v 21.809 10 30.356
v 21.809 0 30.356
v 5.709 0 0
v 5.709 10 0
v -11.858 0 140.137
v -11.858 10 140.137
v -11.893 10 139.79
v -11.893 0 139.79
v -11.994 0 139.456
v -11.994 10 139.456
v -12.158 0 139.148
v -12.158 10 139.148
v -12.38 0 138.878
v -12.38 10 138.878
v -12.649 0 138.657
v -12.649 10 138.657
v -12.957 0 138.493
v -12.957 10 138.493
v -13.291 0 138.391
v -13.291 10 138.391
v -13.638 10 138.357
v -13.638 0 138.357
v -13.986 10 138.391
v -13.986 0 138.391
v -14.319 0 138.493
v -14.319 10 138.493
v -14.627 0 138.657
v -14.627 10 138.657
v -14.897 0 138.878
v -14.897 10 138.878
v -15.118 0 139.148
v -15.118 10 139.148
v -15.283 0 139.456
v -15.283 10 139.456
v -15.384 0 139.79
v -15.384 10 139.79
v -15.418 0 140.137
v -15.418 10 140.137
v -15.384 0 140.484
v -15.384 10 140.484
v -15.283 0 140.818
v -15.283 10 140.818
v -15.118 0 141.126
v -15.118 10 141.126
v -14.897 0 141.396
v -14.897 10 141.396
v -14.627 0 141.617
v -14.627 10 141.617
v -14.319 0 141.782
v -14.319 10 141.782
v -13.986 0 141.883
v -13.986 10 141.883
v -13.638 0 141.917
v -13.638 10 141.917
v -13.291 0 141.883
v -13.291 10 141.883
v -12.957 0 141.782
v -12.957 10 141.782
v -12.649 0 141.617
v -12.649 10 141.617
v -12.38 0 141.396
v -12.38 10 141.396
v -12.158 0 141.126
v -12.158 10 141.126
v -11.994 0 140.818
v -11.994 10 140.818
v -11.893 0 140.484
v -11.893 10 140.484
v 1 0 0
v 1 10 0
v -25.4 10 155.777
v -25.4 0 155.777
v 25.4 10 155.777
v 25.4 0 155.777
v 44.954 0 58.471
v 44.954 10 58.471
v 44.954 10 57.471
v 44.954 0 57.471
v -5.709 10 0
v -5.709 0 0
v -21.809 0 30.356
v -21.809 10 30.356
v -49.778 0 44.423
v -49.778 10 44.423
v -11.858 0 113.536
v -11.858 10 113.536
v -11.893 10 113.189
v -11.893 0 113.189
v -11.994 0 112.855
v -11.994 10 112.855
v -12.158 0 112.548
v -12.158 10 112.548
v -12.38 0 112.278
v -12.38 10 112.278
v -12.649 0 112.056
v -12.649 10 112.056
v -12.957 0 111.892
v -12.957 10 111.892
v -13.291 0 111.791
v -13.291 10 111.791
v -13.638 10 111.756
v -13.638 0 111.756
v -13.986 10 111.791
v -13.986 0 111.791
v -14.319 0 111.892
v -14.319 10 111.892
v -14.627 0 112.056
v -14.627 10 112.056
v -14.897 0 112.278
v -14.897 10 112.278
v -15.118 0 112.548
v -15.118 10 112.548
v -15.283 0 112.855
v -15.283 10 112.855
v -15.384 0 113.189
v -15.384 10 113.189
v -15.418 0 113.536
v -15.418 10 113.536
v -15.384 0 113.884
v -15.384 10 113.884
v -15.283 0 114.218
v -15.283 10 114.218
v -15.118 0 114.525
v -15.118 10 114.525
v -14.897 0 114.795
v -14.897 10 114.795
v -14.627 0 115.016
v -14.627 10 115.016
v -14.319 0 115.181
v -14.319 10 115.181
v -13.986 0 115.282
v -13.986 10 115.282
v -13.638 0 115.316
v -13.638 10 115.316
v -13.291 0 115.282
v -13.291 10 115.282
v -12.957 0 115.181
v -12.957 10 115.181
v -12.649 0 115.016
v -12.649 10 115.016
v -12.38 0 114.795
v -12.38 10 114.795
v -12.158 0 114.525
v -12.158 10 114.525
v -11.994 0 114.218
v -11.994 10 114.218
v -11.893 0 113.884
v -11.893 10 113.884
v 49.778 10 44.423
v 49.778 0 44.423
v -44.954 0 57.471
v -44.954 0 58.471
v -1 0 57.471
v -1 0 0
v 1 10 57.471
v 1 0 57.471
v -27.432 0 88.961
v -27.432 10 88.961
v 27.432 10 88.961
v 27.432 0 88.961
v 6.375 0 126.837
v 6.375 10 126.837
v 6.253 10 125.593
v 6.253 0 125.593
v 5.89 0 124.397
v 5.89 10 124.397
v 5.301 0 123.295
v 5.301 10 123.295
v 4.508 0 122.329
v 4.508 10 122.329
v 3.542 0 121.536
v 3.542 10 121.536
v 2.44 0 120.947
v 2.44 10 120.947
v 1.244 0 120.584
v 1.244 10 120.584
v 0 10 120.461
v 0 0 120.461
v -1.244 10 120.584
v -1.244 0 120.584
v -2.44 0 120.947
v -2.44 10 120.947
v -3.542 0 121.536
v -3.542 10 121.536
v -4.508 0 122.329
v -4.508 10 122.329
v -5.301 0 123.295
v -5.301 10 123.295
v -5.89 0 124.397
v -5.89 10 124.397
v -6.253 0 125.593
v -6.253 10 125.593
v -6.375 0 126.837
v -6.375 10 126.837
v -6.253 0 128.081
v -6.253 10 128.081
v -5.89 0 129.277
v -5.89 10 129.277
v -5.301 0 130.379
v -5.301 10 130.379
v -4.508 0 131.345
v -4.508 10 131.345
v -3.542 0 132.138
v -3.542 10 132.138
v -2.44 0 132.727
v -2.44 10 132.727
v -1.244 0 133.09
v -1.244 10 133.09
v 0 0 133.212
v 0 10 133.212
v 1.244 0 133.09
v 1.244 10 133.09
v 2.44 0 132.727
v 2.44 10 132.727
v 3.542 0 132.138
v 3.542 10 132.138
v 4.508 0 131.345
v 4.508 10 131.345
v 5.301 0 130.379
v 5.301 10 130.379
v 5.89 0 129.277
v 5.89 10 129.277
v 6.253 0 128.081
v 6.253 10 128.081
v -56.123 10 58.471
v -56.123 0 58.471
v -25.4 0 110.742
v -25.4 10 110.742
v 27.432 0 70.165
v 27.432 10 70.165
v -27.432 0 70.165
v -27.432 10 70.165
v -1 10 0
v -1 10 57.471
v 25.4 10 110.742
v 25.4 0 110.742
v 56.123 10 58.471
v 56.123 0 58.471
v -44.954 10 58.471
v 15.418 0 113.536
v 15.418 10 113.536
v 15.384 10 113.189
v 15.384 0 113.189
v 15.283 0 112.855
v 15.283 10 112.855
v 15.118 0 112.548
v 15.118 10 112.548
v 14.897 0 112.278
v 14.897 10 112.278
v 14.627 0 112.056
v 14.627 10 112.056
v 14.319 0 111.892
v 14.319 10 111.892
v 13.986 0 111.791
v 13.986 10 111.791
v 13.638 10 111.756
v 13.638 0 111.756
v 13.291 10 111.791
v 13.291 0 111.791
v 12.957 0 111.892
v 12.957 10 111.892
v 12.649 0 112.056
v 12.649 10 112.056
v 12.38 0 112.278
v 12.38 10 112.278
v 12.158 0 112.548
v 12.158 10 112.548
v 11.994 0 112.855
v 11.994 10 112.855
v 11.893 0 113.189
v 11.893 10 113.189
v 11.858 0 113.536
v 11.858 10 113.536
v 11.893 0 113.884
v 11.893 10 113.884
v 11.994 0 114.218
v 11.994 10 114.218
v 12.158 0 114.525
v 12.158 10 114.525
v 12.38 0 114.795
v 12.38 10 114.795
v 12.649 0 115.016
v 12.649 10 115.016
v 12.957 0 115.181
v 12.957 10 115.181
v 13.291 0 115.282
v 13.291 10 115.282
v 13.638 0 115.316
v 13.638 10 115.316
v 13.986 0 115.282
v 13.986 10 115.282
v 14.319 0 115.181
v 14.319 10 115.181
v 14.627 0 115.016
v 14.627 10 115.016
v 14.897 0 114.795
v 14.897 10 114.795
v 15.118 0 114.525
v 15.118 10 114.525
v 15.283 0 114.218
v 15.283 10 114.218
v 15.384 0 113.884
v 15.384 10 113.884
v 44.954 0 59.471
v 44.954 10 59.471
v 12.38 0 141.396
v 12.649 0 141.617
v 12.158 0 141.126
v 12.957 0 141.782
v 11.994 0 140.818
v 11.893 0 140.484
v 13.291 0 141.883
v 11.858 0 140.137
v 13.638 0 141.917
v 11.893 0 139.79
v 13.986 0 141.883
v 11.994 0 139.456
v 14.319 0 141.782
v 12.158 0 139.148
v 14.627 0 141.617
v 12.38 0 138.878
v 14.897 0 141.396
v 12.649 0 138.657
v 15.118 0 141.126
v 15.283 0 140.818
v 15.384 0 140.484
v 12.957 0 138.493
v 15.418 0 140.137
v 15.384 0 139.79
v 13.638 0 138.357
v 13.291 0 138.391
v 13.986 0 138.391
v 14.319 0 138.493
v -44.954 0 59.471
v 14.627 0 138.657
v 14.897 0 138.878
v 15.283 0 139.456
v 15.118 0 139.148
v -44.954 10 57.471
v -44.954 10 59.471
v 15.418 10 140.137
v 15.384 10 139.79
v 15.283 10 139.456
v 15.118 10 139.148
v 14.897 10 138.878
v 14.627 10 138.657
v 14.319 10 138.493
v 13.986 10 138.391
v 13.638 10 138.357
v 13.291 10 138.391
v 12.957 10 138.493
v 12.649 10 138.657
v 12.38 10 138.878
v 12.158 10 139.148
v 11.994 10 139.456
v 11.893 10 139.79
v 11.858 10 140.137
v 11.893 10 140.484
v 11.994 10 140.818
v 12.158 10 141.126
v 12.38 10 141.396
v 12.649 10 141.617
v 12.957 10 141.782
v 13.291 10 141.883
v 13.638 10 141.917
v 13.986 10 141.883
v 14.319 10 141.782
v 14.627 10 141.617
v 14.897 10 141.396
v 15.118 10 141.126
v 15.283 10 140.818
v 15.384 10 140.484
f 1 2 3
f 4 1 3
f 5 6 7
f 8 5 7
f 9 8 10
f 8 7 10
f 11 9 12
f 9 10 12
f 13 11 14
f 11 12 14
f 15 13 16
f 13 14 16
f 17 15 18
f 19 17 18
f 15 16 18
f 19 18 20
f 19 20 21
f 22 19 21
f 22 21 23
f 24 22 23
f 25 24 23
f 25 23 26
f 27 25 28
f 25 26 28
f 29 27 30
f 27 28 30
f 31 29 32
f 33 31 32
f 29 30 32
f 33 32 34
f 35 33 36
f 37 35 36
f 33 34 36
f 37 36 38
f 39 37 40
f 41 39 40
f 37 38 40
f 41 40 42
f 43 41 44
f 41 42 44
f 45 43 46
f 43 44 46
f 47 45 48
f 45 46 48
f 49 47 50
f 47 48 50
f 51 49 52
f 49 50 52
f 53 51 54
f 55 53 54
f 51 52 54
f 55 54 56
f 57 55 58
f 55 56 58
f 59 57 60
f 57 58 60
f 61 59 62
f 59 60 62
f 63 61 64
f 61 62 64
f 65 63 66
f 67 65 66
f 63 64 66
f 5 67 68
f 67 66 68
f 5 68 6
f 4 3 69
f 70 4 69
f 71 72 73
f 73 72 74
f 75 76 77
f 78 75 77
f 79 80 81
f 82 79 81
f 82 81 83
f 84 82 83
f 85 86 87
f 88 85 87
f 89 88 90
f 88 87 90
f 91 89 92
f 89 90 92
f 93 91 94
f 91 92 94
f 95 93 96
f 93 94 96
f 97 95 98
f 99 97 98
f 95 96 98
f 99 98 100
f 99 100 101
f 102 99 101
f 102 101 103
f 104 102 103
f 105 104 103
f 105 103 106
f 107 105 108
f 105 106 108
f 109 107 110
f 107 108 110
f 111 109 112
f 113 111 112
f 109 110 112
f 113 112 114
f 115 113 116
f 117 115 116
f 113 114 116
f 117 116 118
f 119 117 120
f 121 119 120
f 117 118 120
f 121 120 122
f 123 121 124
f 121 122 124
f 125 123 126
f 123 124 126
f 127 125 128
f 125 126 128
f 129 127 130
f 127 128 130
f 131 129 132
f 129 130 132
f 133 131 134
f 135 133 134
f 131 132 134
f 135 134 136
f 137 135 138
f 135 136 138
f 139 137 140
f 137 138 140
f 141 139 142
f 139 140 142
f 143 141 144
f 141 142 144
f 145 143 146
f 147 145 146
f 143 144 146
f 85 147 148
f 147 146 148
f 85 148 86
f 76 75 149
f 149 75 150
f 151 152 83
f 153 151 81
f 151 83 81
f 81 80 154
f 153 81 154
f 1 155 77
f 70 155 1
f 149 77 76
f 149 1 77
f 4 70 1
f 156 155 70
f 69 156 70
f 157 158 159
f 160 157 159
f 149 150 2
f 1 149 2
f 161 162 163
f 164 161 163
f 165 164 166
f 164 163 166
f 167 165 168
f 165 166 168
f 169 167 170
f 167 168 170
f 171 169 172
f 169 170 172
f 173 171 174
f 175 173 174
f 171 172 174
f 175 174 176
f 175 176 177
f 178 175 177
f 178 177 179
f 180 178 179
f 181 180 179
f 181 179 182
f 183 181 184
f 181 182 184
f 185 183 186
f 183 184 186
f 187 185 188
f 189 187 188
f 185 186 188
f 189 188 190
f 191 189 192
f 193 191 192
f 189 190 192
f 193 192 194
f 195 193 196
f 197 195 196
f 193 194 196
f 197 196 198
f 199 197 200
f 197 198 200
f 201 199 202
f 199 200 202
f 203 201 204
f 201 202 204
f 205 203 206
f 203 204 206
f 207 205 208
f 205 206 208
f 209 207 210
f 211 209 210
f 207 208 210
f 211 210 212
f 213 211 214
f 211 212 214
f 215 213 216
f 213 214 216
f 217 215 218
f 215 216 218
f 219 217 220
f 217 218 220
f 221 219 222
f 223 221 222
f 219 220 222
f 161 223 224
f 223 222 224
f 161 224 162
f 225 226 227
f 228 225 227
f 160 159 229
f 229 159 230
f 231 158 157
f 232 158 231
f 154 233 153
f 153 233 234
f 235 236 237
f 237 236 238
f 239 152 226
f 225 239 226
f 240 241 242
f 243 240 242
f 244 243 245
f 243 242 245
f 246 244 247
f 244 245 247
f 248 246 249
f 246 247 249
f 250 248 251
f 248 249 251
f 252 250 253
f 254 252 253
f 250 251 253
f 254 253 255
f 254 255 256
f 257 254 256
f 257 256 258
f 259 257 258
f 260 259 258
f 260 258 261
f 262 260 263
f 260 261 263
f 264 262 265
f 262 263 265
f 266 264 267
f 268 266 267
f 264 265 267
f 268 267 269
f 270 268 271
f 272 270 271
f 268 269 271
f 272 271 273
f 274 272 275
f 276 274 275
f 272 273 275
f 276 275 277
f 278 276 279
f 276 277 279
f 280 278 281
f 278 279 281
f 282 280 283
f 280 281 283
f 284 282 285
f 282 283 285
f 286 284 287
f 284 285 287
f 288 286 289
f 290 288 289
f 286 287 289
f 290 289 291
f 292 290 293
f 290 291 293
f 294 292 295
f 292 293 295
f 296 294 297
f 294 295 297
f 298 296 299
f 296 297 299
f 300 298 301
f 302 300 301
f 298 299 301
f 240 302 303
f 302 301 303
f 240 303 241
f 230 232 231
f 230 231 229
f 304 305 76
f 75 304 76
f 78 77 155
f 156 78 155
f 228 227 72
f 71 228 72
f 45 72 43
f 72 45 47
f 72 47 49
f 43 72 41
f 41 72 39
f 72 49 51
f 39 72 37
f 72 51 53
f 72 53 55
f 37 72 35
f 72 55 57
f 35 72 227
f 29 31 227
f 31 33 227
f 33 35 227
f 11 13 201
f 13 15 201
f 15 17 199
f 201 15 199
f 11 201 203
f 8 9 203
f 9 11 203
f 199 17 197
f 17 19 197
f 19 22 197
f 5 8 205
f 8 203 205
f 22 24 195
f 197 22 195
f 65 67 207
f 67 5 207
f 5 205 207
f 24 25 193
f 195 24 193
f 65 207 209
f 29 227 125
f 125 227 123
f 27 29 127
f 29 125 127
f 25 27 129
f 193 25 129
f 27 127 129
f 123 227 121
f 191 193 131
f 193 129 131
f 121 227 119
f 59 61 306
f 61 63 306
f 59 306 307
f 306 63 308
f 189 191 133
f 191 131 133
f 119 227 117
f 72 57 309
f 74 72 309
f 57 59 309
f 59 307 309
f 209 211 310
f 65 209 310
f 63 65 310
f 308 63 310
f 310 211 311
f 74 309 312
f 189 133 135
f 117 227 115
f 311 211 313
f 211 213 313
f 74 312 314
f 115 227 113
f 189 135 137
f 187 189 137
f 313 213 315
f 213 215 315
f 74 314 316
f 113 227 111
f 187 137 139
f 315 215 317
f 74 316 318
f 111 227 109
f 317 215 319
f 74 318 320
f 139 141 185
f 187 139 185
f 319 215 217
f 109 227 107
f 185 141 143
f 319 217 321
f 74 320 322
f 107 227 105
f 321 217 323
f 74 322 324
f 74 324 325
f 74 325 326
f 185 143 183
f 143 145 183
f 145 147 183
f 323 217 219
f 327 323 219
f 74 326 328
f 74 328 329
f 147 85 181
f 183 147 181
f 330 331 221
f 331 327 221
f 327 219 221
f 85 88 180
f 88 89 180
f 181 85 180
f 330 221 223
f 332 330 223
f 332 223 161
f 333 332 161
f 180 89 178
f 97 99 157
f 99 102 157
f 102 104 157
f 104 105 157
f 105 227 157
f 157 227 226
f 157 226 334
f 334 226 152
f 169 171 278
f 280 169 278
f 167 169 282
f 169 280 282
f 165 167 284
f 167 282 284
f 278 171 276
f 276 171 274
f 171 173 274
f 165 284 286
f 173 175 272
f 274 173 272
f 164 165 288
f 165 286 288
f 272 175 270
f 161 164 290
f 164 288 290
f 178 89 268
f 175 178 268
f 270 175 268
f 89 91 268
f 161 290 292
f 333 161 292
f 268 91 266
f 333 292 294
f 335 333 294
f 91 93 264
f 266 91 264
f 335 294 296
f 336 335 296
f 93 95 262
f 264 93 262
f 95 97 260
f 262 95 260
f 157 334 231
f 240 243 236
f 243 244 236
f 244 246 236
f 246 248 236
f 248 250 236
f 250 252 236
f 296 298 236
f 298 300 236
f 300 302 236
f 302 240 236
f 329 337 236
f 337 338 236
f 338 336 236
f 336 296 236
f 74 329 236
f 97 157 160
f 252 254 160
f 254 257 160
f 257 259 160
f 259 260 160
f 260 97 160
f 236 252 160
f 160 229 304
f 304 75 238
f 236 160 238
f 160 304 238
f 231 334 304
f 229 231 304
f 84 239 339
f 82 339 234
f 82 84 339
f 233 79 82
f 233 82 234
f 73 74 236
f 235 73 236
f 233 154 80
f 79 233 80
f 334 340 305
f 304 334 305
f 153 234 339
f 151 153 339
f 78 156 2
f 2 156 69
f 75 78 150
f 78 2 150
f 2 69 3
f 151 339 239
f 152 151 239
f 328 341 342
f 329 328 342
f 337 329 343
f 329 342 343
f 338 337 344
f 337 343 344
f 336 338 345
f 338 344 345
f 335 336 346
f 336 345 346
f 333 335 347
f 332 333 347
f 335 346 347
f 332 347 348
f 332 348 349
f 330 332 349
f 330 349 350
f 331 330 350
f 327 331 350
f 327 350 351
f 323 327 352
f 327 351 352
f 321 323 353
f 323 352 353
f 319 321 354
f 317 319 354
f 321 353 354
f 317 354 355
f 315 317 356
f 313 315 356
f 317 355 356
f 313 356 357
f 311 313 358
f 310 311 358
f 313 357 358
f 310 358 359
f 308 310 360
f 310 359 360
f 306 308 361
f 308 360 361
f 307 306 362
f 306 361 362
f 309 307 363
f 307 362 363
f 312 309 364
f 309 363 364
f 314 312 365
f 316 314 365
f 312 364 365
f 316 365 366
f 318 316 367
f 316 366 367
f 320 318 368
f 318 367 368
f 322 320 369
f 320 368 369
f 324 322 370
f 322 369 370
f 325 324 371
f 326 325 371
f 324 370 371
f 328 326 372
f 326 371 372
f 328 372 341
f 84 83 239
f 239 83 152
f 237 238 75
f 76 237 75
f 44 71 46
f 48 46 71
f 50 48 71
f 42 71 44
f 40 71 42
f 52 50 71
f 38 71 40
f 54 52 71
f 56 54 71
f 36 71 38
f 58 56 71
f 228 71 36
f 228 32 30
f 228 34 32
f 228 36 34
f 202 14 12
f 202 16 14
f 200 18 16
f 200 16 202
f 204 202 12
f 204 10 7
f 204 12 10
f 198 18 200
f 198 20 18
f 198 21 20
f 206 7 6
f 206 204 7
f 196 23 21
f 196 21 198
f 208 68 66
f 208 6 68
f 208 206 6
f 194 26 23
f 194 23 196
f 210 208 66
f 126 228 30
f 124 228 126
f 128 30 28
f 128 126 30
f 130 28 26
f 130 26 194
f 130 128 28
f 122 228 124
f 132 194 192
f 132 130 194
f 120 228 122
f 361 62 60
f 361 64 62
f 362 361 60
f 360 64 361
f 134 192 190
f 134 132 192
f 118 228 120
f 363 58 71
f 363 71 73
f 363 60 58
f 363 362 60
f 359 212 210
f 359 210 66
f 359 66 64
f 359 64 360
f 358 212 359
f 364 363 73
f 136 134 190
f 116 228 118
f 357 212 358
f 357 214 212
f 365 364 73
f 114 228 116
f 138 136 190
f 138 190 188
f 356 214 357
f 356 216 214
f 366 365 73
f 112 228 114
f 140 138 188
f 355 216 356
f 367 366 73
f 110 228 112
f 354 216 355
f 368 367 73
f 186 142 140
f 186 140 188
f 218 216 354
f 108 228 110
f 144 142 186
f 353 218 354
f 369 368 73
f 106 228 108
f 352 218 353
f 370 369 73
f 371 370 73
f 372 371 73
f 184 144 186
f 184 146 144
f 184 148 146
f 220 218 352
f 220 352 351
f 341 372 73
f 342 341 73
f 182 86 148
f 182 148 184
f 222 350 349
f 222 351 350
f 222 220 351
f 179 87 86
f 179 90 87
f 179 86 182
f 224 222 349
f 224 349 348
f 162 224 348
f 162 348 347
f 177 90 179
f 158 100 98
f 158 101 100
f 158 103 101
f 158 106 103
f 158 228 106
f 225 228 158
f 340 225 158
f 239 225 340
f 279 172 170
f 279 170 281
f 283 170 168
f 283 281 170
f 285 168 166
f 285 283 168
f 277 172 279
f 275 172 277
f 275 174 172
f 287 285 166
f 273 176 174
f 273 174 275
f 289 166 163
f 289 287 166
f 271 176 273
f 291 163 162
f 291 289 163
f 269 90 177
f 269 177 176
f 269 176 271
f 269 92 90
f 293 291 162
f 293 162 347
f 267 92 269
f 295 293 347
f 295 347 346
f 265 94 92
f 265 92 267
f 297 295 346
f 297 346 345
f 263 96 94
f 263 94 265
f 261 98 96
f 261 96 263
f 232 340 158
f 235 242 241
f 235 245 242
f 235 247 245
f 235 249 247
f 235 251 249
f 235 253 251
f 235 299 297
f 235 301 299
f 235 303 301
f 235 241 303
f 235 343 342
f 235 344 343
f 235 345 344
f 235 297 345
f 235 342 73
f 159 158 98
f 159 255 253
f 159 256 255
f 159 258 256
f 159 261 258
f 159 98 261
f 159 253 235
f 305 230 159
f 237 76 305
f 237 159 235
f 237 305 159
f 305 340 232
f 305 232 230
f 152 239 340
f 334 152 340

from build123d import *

# Parameters (mm, degrees)
BOSS_EXTRUDE1_DEPTH = 10
CUT_EXTRUDE1_DEPTH  = 10
SKETCH3_R           = 1.78
SKETCH3_R_2         = 6.3754
CUT_EXTRUDE2_DEPTH  = 10
SKETCH4_W           = 54.864
SKETCH4_H           = 18.796
CUT_EXTRUDE3_DEPTH  = 10


with BuildPart() as part:
    # Sketch1 → Boss-Extrude1 (new body)
    with BuildSketch(Plane(origin=(0, 0, 0), x_dir=(1, 0, 0), z_dir=(0, 1, 0))):
        Polygon((21.809458386, -30.355701196), (5.70896, 0), (0, 0), (0, -58.4708), (44.953527672, -58.4708), (49.778195113, -44.423058366), align=None)
        Polygon((0, -58.4708), (0, 0), (-5.70896, 0), (-21.809458386, -30.355701196), (-49.778195113, -44.423058366), (-44.953527672, -58.4708), align=None)
        Polygon((44.953527672, -58.4708), (0, -58.4708), (-44.953527672, -58.4708), (-56.122917264, -58.4708), (-25.4, -110.742004672), (-25.4, -155.77676904), (25.4, -155.77676904), (25.4, -110.742004672), (56.122917264, -58.4708), align=None)
    extrude(amount=BOSS_EXTRUDE1_DEPTH)

    # Sketch2 → Cut-Extrude1 (cut)
    with BuildSketch(Plane(origin=(0, 10, 0), x_dir=(1, 0, 0), z_dir=(0, 1, 0))):
        Polygon((-1, 0), (-1, -57.4708), (-44.953527672, -57.4708), (-44.953527672, -59.4708), (44.953527672, -59.4708), (44.953527672, -57.4708), (1, -57.4708), (1, 0), align=None)
    extrude(amount=-CUT_EXTRUDE1_DEPTH, mode=Mode.SUBTRACT)

    # Sketch3 → Cut-Extrude2 (cut)
    with BuildSketch(Plane(origin=(0, 10, 0), x_dir=(1, 0, 0), z_dir=(0, 1, 0))):
        with Locations((-13.638317973, -140.137106355)):
            Circle(SKETCH3_R)
        with Locations((13.638317973, -140.137106355)):
            Circle(SKETCH3_R)
        with Locations((13.638317973, -113.536445998)):
            Circle(SKETCH3_R)
        with Locations((-13.638317973, -113.536445998)):
            Circle(SKETCH3_R)
        with Locations((0, -126.836776177)):
            Circle(SKETCH3_R_2)
    extrude(amount=-CUT_EXTRUDE2_DEPTH, mode=Mode.SUBTRACT)

    # Sketch4 → Cut-Extrude3 (cut)
    with BuildSketch(Plane(origin=(0, 10, 0), x_dir=(1, 0, 0), z_dir=(0, 1, 0))):
        with Locations((0, -79.563322367)):
            Rectangle(SKETCH4_W, SKETCH4_H)
    extrude(amount=-CUT_EXTRUDE3_DEPTH, mode=Mode.SUBTRACT)


solid = part.part
